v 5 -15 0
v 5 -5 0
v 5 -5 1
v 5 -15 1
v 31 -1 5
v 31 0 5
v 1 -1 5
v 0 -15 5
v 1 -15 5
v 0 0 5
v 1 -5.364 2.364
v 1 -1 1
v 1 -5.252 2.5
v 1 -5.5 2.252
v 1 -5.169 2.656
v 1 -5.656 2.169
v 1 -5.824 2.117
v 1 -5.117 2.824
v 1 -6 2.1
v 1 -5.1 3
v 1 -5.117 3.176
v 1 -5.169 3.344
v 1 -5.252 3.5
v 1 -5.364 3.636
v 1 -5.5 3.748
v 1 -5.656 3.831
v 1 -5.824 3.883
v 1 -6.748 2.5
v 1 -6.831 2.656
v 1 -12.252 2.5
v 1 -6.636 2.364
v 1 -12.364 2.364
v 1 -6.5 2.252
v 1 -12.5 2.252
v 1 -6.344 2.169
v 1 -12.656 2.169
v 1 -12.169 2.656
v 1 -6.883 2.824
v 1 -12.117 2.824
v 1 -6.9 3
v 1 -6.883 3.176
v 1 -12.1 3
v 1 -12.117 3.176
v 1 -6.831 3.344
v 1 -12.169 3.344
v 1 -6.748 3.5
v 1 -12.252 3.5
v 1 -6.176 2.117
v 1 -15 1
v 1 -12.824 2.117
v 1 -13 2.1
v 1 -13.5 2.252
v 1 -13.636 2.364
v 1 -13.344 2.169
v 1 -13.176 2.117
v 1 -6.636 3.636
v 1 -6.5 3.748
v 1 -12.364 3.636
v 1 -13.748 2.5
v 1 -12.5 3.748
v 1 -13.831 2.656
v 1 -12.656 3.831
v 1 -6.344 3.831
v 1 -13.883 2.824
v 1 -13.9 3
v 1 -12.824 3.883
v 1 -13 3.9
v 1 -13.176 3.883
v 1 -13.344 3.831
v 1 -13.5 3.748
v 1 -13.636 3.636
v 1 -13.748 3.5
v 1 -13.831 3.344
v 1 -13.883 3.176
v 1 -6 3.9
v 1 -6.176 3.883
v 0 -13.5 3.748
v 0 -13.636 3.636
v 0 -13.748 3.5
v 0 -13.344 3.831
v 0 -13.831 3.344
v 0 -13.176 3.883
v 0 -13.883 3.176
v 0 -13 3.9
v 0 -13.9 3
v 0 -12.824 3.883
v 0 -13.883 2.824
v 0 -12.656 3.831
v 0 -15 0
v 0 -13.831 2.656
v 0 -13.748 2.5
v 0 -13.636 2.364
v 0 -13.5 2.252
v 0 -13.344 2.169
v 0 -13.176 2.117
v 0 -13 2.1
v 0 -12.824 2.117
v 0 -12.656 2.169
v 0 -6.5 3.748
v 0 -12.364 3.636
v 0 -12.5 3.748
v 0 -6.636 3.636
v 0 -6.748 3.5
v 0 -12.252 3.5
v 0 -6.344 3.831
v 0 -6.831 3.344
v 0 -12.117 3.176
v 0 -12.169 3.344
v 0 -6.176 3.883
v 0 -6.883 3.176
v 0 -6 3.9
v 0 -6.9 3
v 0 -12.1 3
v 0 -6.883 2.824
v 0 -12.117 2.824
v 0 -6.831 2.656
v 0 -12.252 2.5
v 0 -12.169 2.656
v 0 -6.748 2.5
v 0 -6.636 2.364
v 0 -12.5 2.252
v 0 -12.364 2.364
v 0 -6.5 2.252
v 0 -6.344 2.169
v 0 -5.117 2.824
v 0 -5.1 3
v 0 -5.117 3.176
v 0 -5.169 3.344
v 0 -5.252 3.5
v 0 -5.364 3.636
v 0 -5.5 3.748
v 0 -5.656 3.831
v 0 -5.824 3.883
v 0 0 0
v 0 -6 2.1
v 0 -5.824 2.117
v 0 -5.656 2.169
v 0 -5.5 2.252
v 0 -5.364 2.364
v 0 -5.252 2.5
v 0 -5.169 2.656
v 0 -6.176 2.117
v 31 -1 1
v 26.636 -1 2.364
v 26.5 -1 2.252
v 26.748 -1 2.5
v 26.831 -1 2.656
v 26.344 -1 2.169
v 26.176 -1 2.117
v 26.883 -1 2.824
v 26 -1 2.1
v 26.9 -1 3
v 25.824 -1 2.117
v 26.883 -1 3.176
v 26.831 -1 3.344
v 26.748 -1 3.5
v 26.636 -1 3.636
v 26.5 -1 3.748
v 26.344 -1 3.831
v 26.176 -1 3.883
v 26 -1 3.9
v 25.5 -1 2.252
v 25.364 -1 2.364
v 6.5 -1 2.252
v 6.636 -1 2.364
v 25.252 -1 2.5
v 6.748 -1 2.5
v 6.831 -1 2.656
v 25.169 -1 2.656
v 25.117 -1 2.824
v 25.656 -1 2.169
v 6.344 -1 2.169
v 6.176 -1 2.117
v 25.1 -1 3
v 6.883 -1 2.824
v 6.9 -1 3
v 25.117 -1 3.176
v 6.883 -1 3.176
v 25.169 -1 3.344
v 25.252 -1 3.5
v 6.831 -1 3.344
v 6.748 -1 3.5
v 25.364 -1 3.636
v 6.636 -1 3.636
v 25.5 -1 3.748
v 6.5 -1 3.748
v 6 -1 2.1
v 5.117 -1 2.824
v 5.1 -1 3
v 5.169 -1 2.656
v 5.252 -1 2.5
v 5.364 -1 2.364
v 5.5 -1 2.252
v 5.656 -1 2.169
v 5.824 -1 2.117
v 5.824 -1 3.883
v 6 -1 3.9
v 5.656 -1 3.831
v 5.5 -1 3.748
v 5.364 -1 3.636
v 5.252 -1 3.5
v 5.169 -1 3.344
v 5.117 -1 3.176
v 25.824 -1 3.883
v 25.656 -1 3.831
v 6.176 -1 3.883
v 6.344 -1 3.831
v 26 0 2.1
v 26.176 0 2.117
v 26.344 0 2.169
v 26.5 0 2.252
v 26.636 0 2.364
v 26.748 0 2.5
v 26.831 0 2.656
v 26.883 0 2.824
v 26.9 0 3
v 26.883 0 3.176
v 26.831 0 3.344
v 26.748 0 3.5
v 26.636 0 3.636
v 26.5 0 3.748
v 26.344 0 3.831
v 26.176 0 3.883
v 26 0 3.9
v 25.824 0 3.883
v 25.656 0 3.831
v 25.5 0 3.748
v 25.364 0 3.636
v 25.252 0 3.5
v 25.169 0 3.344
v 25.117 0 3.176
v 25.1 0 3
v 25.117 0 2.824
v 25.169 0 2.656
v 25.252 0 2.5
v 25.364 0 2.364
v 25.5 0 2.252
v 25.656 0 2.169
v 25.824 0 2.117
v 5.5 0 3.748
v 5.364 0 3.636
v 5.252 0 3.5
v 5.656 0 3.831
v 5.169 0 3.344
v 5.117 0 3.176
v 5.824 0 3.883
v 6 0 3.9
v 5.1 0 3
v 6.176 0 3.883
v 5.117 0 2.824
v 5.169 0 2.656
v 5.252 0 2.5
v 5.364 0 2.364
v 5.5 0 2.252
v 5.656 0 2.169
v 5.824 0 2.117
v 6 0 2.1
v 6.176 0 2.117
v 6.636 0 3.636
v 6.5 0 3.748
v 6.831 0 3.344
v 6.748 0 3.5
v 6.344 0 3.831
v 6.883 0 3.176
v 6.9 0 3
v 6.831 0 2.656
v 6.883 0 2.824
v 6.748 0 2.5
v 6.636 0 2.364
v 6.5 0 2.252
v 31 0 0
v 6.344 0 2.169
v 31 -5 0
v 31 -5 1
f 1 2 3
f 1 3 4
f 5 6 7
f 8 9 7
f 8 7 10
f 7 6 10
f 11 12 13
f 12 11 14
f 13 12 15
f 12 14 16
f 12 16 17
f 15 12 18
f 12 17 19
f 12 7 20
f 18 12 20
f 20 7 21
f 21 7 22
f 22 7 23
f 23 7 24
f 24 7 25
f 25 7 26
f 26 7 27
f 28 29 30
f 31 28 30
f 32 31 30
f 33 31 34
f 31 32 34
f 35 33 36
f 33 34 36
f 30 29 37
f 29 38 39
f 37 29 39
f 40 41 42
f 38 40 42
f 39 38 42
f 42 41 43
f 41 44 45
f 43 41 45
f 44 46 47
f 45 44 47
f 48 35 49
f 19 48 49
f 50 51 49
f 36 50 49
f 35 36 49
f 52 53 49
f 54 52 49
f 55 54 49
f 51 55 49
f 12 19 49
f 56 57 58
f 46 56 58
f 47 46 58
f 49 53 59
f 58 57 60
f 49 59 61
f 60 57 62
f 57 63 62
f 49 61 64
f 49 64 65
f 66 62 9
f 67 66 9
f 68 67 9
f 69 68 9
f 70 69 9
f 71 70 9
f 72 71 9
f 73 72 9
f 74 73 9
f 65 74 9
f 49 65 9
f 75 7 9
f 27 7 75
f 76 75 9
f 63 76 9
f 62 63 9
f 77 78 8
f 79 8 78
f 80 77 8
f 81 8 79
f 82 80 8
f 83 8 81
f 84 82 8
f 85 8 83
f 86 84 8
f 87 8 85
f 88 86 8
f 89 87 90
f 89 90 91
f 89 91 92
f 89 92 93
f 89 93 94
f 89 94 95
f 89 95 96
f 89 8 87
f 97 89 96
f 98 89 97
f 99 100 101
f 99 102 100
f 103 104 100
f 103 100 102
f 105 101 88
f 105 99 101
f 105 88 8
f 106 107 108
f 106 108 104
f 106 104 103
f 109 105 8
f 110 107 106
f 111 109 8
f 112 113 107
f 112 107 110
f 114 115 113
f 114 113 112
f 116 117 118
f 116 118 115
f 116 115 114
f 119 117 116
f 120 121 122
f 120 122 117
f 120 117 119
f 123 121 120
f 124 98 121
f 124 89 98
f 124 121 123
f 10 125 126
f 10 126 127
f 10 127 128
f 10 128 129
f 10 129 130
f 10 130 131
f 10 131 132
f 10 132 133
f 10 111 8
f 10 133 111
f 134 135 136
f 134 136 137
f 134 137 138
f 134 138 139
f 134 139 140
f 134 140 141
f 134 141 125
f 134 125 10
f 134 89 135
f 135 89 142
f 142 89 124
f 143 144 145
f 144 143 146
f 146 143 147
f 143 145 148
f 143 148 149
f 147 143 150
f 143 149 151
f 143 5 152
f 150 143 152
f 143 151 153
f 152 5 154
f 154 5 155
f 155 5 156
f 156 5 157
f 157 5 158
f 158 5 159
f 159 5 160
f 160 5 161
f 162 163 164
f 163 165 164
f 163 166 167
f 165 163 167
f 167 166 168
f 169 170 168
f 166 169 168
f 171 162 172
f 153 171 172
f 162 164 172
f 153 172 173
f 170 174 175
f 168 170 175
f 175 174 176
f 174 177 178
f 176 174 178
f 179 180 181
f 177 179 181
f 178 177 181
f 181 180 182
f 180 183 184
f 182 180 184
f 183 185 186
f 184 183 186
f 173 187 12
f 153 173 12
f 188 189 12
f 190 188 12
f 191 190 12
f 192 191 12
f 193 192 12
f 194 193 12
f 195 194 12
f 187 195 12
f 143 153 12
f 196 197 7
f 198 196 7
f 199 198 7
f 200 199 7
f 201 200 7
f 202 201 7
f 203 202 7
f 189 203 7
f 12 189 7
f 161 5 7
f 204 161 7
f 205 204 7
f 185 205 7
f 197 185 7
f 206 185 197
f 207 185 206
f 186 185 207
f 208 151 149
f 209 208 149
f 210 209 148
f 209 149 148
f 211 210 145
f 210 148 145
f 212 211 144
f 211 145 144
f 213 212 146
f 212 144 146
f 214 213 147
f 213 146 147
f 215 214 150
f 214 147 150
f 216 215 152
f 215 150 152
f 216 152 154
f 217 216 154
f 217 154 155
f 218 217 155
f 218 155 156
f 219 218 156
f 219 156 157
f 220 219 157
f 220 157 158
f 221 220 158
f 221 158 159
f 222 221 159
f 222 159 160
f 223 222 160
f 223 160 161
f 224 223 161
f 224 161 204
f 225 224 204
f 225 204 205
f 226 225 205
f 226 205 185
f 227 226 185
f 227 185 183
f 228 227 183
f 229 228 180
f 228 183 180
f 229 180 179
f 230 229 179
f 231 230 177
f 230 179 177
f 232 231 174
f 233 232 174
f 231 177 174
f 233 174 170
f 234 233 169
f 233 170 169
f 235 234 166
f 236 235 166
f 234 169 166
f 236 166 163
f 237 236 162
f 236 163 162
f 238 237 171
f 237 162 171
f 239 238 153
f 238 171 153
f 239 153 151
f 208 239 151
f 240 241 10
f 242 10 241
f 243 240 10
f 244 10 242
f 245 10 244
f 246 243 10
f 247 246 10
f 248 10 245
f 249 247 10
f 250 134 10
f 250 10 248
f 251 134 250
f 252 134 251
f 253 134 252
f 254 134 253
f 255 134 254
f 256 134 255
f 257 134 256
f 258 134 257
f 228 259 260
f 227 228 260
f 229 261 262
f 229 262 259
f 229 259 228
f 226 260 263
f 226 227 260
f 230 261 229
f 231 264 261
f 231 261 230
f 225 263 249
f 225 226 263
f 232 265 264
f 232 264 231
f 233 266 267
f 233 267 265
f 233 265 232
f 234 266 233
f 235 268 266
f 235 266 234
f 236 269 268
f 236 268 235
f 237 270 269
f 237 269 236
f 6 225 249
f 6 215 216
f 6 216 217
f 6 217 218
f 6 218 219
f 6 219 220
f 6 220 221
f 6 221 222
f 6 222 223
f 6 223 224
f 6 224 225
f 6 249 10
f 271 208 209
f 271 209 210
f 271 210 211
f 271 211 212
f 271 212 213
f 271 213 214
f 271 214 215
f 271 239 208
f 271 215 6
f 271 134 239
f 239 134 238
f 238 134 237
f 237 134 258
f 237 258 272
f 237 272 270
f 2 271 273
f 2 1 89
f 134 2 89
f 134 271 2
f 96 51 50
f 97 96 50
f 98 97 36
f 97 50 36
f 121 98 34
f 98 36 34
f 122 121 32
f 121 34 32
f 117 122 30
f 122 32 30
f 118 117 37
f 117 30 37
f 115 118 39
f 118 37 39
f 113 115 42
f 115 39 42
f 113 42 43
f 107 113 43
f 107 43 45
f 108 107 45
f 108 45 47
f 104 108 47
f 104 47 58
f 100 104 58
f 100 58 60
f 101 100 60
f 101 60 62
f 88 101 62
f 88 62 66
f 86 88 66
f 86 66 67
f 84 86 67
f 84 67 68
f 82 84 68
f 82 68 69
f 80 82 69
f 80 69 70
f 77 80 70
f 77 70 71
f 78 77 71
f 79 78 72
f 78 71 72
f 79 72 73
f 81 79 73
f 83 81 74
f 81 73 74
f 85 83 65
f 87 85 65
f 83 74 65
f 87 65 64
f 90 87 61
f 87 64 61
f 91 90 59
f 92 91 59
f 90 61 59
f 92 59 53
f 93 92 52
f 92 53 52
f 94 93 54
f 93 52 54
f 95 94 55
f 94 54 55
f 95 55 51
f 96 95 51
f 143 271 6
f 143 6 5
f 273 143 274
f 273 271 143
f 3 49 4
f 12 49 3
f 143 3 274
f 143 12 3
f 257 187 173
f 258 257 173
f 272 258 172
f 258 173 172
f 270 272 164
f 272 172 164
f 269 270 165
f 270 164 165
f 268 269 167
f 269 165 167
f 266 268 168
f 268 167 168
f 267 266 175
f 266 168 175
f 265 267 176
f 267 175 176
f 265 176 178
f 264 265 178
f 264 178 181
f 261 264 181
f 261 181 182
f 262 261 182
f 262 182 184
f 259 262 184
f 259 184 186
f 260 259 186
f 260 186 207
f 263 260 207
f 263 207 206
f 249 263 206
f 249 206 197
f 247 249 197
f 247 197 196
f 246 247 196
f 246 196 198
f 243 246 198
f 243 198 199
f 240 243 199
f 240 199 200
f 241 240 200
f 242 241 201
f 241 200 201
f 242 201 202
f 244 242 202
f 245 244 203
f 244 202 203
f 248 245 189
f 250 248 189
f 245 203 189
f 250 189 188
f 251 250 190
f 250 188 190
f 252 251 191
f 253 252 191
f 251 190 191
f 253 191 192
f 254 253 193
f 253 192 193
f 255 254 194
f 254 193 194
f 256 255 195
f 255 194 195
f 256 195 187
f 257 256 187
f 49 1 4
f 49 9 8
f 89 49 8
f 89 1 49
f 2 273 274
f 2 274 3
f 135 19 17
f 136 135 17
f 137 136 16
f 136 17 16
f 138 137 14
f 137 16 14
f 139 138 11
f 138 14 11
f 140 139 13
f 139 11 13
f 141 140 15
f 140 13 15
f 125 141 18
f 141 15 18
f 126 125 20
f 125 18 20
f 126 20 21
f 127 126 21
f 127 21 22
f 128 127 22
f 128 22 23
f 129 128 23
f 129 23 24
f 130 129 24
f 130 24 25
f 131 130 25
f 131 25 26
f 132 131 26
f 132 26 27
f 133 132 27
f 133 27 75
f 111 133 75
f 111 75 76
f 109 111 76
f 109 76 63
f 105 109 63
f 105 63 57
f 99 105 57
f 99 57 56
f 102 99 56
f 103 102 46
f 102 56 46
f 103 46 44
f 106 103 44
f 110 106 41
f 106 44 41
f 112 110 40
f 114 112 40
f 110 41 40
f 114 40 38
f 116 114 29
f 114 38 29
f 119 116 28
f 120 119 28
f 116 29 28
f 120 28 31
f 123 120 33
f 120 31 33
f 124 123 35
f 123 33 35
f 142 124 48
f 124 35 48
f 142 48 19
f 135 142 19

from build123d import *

# Parameters (mm, degrees)
BOSS_EXTRU_1_DEPTH      = 5
ENL_V_MAT_EXTRU_1_DEPTH = 4
ESQUISSE4_R             = 0.9
ENL_V_MAT_EXTRU_2_DEPTH = 10
ESQUISSE3_R             = 0.9
ENL_V_MAT_EXTRU_3_DEPTH = 10


with BuildPart() as part:
    # Esquisse1 → Boss.-Extru.1 (new body)
    with BuildSketch(Plane.XY):
        Polygon((0, 0), (31, 0), (31, -5), (5, -5), (5, -15), (0, -15), align=None)
    extrude(amount=BOSS_EXTRU_1_DEPTH)

    # Esquisse2 → Enlèv. mat.-Extru.1 (cut)
    with BuildSketch(Plane.XY.offset(5)):
        Polygon((1, -15), (5, -15), (5, -5), (31, -5), (31, -1), (1, -1), align=None)
    extrude(amount=-ENL_V_MAT_EXTRU_1_DEPTH, mode=Mode.SUBTRACT)

    # Esquisse4 → Enlèv. mat.-Extru.2 (cut)
    with BuildSketch(Plane.XZ.offset(1)):
        with Locations(Location((26, 3, 0), (0, 0, 270))):
            Circle(ESQUISSE4_R)
        with Locations(Location((6, 3, 0), (0, 0, 270))):
            Circle(ESQUISSE4_R)
    extrude(amount=-ENL_V_MAT_EXTRU_2_DEPTH, mode=Mode.SUBTRACT)

    # Esquisse3 → Enlèv. mat.-Extru.3 (cut)
    with BuildSketch(Plane(origin=(1, 0, 0), x_dir=(0, 0, -1), z_dir=(1, 0, 0))):
        with Locations((-3, -6)):
            Circle(ESQUISSE3_R)
        with Locations((-3, -13)):
            Circle(ESQUISSE3_R)
    extrude(amount=-ENL_V_MAT_EXTRU_3_DEPTH, mode=Mode.SUBTRACT)


solid = part.part
